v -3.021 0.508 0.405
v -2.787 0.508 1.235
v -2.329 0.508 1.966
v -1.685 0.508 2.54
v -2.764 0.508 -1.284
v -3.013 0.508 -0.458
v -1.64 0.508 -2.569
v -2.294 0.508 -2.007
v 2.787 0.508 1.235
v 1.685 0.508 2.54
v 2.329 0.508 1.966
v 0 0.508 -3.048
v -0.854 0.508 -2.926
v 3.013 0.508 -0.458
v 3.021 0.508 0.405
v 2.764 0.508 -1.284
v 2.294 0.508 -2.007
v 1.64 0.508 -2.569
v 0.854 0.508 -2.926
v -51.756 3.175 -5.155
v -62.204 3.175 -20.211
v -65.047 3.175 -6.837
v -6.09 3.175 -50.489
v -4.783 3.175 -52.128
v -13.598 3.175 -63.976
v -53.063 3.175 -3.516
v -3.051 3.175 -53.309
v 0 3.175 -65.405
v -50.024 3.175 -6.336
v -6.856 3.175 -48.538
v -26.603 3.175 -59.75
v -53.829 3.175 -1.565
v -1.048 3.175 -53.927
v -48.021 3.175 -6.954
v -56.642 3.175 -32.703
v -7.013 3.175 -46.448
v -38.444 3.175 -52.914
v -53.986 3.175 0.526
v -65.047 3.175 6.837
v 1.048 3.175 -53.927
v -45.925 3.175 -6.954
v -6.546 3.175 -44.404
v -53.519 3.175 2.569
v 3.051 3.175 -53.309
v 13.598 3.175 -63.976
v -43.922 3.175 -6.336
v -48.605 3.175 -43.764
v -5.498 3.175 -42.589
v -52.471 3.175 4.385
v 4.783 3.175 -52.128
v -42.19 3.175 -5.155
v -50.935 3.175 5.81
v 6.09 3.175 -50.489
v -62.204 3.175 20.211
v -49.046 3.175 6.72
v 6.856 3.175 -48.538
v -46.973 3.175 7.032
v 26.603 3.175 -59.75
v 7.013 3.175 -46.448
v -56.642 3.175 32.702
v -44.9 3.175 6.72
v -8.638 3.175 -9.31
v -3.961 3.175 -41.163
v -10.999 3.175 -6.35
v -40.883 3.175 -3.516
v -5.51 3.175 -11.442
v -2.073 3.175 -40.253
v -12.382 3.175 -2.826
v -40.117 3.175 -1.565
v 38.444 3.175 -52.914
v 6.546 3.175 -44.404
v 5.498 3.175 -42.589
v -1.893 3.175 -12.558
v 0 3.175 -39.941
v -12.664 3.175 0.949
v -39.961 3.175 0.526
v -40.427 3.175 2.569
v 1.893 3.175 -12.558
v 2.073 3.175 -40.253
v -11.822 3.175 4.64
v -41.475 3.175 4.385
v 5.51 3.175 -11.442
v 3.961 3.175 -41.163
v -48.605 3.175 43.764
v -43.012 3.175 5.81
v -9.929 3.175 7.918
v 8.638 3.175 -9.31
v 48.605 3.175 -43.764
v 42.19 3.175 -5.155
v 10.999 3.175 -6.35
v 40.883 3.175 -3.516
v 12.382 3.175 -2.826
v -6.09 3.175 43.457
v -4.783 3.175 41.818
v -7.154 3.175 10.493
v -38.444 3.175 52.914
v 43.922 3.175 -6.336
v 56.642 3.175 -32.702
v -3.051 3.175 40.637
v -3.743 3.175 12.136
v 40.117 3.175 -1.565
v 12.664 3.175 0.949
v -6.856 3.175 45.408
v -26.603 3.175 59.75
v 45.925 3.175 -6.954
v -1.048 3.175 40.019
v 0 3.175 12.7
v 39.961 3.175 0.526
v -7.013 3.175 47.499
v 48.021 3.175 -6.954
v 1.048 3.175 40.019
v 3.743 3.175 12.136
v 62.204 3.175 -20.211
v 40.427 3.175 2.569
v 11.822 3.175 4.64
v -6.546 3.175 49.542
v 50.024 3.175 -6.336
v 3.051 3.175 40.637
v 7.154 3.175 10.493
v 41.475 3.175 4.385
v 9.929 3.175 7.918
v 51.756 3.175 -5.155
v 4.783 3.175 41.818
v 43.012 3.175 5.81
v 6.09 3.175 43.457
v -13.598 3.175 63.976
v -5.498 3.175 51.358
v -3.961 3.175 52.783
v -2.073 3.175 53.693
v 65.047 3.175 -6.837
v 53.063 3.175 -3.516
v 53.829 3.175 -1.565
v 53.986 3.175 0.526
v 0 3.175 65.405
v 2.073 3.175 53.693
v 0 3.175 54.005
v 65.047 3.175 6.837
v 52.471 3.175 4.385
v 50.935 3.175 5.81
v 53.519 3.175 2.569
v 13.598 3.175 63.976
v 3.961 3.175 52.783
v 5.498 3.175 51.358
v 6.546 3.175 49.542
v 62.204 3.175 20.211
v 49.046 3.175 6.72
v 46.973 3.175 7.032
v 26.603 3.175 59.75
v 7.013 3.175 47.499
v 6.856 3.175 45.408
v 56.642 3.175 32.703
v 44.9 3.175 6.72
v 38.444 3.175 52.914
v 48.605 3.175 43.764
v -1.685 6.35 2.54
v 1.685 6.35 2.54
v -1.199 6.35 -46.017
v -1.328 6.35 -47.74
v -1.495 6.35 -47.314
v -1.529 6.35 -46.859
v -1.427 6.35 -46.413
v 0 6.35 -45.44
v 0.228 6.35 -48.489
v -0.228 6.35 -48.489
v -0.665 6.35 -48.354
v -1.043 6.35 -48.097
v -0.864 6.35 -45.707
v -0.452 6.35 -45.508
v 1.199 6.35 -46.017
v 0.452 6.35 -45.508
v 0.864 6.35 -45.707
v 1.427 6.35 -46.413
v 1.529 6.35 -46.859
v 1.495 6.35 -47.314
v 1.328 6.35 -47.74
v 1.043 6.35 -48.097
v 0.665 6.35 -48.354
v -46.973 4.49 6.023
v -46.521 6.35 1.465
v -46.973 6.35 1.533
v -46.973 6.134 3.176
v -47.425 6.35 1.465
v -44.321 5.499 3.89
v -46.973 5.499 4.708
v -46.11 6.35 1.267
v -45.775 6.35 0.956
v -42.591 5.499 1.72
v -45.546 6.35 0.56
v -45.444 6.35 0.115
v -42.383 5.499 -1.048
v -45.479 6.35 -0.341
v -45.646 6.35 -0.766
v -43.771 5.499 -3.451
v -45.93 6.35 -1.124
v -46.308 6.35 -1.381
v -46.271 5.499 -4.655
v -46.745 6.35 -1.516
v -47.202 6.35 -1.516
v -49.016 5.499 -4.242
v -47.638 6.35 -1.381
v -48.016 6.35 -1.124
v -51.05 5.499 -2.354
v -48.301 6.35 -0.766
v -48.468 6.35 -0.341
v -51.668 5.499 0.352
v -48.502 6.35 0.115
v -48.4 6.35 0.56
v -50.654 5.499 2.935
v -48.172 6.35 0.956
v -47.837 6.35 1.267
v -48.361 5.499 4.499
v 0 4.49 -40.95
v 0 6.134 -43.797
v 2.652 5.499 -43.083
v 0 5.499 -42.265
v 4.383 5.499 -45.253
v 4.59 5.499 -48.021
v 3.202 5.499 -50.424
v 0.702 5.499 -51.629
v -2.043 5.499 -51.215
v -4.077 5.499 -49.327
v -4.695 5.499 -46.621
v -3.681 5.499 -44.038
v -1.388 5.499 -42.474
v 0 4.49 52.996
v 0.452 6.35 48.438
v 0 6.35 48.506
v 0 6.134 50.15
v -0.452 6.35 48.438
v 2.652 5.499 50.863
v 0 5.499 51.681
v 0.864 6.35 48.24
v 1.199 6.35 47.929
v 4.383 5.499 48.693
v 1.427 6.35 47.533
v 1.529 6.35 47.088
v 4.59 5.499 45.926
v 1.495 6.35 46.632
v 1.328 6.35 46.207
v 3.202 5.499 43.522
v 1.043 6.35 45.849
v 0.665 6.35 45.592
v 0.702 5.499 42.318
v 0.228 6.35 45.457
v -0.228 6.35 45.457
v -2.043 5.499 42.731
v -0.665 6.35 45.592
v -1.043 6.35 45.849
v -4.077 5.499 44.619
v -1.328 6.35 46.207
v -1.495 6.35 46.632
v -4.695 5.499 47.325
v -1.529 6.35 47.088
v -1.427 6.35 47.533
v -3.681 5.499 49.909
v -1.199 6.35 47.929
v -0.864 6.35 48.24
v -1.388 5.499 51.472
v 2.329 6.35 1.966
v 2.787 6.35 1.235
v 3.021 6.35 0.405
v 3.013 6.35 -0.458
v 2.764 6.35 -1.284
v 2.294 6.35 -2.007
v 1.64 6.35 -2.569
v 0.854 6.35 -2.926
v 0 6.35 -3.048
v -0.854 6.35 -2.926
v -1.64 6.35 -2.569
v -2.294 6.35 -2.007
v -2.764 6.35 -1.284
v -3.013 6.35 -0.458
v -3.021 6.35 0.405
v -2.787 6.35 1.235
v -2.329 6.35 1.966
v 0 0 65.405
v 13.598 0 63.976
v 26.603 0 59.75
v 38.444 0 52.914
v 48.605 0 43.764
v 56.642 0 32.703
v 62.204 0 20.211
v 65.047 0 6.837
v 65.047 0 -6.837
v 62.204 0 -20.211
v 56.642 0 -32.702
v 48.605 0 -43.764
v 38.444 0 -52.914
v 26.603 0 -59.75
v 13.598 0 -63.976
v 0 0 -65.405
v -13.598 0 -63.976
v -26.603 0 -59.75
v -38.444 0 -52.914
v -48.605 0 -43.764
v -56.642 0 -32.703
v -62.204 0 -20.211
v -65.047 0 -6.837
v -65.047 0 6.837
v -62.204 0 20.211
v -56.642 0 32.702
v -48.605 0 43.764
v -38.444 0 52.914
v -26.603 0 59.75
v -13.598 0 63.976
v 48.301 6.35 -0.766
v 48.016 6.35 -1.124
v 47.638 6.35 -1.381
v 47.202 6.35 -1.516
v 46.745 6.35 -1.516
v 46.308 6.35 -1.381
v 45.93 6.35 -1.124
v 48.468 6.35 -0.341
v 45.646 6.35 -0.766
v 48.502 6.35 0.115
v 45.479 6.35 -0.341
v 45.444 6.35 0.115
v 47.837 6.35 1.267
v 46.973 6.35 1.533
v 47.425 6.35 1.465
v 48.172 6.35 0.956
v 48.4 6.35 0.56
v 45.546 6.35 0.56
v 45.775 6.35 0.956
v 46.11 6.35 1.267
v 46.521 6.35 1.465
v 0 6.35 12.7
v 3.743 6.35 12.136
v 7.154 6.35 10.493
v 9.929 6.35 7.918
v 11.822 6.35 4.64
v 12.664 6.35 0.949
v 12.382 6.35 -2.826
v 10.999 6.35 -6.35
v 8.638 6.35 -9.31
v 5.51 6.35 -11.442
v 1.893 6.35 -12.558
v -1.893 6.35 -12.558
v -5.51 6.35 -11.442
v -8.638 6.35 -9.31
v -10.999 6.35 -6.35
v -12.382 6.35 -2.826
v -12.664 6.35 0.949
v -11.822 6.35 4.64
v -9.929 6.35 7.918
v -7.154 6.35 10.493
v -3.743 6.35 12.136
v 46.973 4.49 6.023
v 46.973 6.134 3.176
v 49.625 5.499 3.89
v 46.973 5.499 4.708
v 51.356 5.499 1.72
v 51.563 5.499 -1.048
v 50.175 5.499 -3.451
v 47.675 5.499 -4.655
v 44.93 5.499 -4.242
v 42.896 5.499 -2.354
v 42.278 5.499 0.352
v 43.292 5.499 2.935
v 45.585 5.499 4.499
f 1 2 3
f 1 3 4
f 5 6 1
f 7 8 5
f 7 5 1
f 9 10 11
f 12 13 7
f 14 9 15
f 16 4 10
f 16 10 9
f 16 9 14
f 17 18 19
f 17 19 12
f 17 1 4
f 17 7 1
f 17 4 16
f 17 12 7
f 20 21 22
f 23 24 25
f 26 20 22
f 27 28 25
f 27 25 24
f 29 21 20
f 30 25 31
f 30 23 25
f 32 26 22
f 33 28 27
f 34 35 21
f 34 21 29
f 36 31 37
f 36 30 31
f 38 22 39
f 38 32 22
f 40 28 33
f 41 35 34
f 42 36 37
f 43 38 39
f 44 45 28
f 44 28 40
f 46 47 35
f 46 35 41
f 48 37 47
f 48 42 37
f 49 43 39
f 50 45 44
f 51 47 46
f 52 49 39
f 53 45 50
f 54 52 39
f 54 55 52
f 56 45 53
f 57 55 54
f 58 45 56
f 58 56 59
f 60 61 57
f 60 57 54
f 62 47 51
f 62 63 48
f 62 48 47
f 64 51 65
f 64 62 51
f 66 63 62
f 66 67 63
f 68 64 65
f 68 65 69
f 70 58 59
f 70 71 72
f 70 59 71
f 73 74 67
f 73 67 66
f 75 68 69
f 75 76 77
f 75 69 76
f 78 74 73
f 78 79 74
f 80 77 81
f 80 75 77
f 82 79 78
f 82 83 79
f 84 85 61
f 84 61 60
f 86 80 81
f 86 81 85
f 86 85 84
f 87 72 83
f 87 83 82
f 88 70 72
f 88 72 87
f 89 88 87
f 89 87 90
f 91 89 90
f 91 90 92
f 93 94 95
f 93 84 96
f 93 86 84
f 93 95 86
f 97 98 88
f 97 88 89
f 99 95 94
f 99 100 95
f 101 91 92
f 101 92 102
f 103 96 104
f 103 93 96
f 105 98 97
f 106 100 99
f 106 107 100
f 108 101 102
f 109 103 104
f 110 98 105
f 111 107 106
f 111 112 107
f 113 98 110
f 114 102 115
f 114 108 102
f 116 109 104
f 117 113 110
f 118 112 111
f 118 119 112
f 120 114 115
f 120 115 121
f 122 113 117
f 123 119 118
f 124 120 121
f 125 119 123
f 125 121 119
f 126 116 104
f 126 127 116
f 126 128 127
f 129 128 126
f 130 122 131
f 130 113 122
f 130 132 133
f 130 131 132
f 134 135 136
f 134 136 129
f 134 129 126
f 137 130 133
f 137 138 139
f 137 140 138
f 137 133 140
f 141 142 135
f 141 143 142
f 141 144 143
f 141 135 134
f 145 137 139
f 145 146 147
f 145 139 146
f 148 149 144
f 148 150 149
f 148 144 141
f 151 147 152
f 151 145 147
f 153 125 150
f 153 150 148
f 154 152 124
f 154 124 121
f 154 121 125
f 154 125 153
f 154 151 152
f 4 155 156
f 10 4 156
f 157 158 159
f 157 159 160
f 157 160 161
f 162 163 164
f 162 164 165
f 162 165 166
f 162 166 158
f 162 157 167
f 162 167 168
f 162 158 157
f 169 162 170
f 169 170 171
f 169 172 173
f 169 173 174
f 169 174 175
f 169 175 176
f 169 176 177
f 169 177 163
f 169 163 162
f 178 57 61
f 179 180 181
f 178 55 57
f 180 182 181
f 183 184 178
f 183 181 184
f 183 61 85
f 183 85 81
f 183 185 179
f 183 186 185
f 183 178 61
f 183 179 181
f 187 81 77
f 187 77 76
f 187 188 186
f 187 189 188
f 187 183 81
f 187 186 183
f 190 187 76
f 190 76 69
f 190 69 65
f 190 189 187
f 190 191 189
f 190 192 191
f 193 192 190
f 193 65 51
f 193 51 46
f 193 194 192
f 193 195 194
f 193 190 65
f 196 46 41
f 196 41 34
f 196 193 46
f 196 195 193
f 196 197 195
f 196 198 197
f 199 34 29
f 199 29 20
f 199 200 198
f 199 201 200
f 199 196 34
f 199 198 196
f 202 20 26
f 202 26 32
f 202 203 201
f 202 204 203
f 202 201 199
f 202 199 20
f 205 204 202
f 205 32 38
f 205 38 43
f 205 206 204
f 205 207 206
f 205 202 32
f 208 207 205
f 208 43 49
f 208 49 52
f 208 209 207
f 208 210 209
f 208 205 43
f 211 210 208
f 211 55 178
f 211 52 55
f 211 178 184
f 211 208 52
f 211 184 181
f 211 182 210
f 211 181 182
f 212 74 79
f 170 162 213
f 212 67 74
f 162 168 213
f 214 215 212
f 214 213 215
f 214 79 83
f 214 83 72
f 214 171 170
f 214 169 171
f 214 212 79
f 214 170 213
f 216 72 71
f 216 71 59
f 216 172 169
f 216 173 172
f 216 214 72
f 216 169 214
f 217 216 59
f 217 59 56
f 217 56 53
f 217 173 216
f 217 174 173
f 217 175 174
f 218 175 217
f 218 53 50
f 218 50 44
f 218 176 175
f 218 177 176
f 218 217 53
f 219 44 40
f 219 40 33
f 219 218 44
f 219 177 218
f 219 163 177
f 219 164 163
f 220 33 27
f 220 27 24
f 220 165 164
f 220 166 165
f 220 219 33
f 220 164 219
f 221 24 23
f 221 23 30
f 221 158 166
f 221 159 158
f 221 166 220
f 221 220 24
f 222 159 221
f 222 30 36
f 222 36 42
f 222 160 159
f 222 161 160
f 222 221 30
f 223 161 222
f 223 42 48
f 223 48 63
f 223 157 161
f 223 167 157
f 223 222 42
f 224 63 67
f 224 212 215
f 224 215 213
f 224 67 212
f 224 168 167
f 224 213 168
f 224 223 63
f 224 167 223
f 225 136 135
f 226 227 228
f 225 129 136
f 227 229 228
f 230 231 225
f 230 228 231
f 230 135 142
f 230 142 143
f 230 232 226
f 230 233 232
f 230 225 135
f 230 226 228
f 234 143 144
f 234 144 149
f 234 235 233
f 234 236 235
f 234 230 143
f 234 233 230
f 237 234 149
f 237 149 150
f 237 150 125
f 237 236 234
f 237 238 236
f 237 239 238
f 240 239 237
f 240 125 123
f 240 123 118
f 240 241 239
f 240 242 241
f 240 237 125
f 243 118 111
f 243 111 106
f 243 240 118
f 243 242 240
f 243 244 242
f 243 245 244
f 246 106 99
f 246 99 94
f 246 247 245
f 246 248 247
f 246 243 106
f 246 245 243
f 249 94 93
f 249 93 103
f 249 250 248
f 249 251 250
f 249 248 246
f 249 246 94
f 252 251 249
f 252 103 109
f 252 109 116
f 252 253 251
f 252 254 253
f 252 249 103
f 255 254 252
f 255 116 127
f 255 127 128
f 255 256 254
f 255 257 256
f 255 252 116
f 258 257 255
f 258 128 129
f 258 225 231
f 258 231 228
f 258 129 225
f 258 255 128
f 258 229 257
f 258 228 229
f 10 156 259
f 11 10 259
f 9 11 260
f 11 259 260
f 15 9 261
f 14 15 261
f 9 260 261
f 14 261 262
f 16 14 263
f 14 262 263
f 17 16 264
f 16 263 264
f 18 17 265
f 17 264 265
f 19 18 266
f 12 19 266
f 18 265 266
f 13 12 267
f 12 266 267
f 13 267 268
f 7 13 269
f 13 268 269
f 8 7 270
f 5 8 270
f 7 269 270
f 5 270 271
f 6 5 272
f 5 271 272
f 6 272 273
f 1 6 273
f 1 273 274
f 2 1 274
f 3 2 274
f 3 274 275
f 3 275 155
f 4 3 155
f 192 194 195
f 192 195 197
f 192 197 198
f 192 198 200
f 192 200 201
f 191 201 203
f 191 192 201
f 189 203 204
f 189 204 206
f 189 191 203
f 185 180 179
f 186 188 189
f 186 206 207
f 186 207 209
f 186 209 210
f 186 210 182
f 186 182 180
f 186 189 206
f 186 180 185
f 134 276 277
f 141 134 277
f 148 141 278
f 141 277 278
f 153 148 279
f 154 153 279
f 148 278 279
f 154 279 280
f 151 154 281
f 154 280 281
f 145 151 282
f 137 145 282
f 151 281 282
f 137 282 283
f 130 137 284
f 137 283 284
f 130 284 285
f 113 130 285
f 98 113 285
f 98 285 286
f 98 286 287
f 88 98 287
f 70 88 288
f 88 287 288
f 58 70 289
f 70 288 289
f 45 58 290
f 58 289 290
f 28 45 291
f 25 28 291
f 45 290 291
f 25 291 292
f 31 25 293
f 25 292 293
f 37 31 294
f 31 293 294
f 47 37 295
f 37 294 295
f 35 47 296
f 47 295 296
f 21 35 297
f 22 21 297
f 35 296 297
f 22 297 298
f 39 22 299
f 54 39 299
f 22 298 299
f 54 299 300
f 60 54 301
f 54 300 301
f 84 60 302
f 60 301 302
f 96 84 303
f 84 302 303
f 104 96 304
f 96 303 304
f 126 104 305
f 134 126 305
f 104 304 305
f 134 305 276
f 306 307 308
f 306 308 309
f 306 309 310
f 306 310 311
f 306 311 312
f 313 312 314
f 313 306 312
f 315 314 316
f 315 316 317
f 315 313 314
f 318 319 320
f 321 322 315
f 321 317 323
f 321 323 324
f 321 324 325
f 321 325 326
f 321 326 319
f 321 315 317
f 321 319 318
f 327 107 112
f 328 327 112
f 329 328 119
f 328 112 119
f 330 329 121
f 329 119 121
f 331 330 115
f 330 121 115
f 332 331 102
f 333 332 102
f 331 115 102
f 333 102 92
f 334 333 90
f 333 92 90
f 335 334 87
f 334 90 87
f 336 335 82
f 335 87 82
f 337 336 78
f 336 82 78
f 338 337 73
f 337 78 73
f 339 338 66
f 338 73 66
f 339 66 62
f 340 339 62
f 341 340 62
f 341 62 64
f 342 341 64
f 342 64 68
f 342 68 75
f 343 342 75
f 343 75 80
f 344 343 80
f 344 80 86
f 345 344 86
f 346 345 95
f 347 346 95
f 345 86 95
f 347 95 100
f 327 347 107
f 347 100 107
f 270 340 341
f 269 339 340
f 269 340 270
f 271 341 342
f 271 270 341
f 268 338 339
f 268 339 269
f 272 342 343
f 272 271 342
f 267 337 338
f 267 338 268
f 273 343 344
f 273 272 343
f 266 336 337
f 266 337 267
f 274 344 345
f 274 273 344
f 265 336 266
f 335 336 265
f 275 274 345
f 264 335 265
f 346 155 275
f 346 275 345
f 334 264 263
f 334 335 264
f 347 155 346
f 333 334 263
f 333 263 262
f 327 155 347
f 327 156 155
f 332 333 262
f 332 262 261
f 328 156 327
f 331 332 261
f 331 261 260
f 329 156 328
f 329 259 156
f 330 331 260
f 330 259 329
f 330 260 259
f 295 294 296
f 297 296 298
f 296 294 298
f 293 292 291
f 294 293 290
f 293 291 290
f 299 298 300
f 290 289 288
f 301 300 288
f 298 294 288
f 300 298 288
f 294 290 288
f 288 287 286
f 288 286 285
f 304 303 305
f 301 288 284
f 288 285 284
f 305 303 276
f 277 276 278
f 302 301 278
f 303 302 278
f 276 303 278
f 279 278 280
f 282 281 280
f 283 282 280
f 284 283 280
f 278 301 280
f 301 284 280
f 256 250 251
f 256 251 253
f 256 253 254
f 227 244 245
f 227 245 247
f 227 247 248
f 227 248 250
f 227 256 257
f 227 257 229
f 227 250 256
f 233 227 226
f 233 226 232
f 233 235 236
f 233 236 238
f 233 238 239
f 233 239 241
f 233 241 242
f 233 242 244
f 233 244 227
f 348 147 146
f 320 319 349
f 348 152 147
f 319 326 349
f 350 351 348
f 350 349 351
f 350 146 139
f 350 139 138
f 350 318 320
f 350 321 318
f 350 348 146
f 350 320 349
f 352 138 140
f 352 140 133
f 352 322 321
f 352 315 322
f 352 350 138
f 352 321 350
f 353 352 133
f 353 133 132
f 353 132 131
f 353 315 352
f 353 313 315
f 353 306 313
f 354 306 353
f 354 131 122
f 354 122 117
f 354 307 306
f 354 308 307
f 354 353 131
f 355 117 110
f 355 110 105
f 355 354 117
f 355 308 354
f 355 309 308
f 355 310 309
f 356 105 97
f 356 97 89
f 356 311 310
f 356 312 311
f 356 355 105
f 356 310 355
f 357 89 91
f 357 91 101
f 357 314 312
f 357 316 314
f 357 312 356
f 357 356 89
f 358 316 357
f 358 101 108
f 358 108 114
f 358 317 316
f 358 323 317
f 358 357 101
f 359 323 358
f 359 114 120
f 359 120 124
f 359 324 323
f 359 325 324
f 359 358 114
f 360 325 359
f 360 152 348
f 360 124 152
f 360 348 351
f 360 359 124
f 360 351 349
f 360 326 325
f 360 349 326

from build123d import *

# Parameters (mm, degrees)
SKETCH1_R           = 65.405
BOSS_EXTRUDE1_DEPTH = 3.175
SKETCH2_R           = 12.7
BOSS_EXTRUDE2_DEPTH = 3.175
CUT_EXTRUDE1_DEPTH  = 5.842
SKETCH4_R           = 7.032250482
BOSS_EXTRUDE3_DEPTH = 3.175
FILLET3_R           = 6.35


with BuildPart() as part:
    # Sketch1 → Boss-Extrude1 (new body)
    with BuildSketch(Plane(origin=(0, 0, 0), x_dir=(1, 0, 0), z_dir=(0, 1, 0))):
        with Locations(Location((0, 0, 0), (0, 0, 270))):
            Circle(SKETCH1_R)
    extrude(amount=BOSS_EXTRUDE1_DEPTH)

    # Sketch2 → Boss-Extrude2 (add)
    with BuildSketch(Plane(origin=(0, 3.175, 0), x_dir=(1, 0, 0), z_dir=(0, 1, 0))):
        with Locations(Location((0, 0, 0), (0, 0, 270))):
            Circle(SKETCH2_R)
    extrude(amount=BOSS_EXTRUDE2_DEPTH)

    # Sketch3 → Cut-Extrude1 (cut)
    with BuildSketch(Plane(origin=(0, 6.35, 0), x_dir=(1, 0, 0), z_dir=(0, 1, 0))):
        with BuildLine():
            Line((-1.684845394, -2.54), (1.684845394, -2.54))
            ThreePointArc((1.684845394, -2.54), (0, 3.048), (-1.684845394, -2.54))
        make_face()
    extrude(amount=-CUT_EXTRUDE1_DEPTH, mode=Mode.SUBTRACT)

    # Sketch4 → Boss-Extrude3 (add)
    with BuildSketch(Plane(origin=(0, 3.175, 0), x_dir=(1, 0, 0), z_dir=(0, 1, 0))):
        with Locations(Location((0, 46.973149897, 0), (0, 0, 270))):
            Circle(SKETCH4_R)
        with Locations(Location((46.973149897, 0, 0), (0, 0, 270))):
            Circle(SKETCH4_R)
        with Locations(Location((0, -46.973149897, 0), (0, 0, 270))):
            Circle(SKETCH4_R)
        with Locations(Location((-46.973149897, 0, 0), (0, 0, 270))):
            Circle(SKETCH4_R)
    extrude(amount=BOSS_EXTRUDE3_DEPTH)

    # Fillet3
    # the kernel refuses this fillet: 6.35 mm, written as the material it takes off along each edge
    with BuildSketch(Plane(origin=(0, 6.35, -46.973149897), x_dir=(0, 0, 1), z_dir=(-1, 0, 0))) as fillet3_piece_1:
        with BuildLine():
            CenterArc((1.532989168, -6.35), FILLET3_R, 30, 60)
            Line((1.532989168, 0), (1.532989168, 0.127))
            Line((1.532989168, 0.127), (7.032250482, 0.127))
            Line((7.032250482, 0.127), (7.159250482, 0))
            ThreePointArc((7.159250482, 0), (7.159250482, -1.5875), (7.142235708, -3.1115))
            Line((7.142235708, -3.1115), (7.032250482, -3.175))
        make_face()
    revolve(axis=Axis((0, 6.35, -46.973149897), (0, 1, 0)), mode=Mode.SUBTRACT)
    with BuildSketch(Plane(origin=(46.973149897, 6.35, 0), x_dir=(0, 0, 1), z_dir=(-1, 0, 0))) as fillet3_piece_2:
        with BuildLine():
            CenterArc((1.532989168, -6.35), FILLET3_R, 30, 60)
            Line((1.532989168, 0), (1.532989168, 0.127))
            Line((1.532989168, 0.127), (7.032250482, 0.127))
            Line((7.032250482, 0.127), (7.159250482, 0))
            ThreePointArc((7.159250482, 0), (7.159250482, -1.5875), (7.142235708, -3.1115))
            Line((7.142235708, -3.1115), (7.032250482, -3.175))
        make_face()
    revolve(axis=Axis((46.973149897, 6.35, 0), (0, 1, 0)), mode=Mode.SUBTRACT)
    with BuildSketch(Plane(origin=(0, 6.35, 46.973149897), x_dir=(0, 0, 1), z_dir=(-1, 0, 0))) as fillet3_piece_3:
        with BuildLine():
            CenterArc((1.532989168, -6.35), FILLET3_R, 30, 60)
            Line((1.532989168, 0), (1.532989168, 0.127))
            Line((1.532989168, 0.127), (7.032250482, 0.127))
            Line((7.032250482, 0.127), (7.159250482, 0))
            ThreePointArc((7.159250482, 0), (7.159250482, -1.5875), (7.142235708, -3.1115))
            Line((7.142235708, -3.1115), (7.032250482, -3.175))
        make_face()
    revolve(axis=Axis((0, 6.35, 46.973149897), (0, 1, 0)), mode=Mode.SUBTRACT)
    with BuildSketch(Plane(origin=(-46.973149897, 6.35, 0), x_dir=(0, 0, 1), z_dir=(-1, 0, 0))) as fillet3_piece_4:
        with BuildLine():
            CenterArc((1.532989168, -6.35), FILLET3_R, 30, 60)
            Line((1.532989168, 0), (1.532989168, 0.127))
            Line((1.532989168, 0.127), (7.032250482, 0.127))
            Line((7.032250482, 0.127), (7.159250482, 0))
            ThreePointArc((7.159250482, 0), (7.159250482, -1.5875), (7.142235708, -3.1115))
            Line((7.142235708, -3.1115), (7.032250482, -3.175))
        make_face()
    revolve(axis=Axis((-46.973149897, 6.35, 0), (0, 1, 0)), mode=Mode.SUBTRACT)


solid = part.part
